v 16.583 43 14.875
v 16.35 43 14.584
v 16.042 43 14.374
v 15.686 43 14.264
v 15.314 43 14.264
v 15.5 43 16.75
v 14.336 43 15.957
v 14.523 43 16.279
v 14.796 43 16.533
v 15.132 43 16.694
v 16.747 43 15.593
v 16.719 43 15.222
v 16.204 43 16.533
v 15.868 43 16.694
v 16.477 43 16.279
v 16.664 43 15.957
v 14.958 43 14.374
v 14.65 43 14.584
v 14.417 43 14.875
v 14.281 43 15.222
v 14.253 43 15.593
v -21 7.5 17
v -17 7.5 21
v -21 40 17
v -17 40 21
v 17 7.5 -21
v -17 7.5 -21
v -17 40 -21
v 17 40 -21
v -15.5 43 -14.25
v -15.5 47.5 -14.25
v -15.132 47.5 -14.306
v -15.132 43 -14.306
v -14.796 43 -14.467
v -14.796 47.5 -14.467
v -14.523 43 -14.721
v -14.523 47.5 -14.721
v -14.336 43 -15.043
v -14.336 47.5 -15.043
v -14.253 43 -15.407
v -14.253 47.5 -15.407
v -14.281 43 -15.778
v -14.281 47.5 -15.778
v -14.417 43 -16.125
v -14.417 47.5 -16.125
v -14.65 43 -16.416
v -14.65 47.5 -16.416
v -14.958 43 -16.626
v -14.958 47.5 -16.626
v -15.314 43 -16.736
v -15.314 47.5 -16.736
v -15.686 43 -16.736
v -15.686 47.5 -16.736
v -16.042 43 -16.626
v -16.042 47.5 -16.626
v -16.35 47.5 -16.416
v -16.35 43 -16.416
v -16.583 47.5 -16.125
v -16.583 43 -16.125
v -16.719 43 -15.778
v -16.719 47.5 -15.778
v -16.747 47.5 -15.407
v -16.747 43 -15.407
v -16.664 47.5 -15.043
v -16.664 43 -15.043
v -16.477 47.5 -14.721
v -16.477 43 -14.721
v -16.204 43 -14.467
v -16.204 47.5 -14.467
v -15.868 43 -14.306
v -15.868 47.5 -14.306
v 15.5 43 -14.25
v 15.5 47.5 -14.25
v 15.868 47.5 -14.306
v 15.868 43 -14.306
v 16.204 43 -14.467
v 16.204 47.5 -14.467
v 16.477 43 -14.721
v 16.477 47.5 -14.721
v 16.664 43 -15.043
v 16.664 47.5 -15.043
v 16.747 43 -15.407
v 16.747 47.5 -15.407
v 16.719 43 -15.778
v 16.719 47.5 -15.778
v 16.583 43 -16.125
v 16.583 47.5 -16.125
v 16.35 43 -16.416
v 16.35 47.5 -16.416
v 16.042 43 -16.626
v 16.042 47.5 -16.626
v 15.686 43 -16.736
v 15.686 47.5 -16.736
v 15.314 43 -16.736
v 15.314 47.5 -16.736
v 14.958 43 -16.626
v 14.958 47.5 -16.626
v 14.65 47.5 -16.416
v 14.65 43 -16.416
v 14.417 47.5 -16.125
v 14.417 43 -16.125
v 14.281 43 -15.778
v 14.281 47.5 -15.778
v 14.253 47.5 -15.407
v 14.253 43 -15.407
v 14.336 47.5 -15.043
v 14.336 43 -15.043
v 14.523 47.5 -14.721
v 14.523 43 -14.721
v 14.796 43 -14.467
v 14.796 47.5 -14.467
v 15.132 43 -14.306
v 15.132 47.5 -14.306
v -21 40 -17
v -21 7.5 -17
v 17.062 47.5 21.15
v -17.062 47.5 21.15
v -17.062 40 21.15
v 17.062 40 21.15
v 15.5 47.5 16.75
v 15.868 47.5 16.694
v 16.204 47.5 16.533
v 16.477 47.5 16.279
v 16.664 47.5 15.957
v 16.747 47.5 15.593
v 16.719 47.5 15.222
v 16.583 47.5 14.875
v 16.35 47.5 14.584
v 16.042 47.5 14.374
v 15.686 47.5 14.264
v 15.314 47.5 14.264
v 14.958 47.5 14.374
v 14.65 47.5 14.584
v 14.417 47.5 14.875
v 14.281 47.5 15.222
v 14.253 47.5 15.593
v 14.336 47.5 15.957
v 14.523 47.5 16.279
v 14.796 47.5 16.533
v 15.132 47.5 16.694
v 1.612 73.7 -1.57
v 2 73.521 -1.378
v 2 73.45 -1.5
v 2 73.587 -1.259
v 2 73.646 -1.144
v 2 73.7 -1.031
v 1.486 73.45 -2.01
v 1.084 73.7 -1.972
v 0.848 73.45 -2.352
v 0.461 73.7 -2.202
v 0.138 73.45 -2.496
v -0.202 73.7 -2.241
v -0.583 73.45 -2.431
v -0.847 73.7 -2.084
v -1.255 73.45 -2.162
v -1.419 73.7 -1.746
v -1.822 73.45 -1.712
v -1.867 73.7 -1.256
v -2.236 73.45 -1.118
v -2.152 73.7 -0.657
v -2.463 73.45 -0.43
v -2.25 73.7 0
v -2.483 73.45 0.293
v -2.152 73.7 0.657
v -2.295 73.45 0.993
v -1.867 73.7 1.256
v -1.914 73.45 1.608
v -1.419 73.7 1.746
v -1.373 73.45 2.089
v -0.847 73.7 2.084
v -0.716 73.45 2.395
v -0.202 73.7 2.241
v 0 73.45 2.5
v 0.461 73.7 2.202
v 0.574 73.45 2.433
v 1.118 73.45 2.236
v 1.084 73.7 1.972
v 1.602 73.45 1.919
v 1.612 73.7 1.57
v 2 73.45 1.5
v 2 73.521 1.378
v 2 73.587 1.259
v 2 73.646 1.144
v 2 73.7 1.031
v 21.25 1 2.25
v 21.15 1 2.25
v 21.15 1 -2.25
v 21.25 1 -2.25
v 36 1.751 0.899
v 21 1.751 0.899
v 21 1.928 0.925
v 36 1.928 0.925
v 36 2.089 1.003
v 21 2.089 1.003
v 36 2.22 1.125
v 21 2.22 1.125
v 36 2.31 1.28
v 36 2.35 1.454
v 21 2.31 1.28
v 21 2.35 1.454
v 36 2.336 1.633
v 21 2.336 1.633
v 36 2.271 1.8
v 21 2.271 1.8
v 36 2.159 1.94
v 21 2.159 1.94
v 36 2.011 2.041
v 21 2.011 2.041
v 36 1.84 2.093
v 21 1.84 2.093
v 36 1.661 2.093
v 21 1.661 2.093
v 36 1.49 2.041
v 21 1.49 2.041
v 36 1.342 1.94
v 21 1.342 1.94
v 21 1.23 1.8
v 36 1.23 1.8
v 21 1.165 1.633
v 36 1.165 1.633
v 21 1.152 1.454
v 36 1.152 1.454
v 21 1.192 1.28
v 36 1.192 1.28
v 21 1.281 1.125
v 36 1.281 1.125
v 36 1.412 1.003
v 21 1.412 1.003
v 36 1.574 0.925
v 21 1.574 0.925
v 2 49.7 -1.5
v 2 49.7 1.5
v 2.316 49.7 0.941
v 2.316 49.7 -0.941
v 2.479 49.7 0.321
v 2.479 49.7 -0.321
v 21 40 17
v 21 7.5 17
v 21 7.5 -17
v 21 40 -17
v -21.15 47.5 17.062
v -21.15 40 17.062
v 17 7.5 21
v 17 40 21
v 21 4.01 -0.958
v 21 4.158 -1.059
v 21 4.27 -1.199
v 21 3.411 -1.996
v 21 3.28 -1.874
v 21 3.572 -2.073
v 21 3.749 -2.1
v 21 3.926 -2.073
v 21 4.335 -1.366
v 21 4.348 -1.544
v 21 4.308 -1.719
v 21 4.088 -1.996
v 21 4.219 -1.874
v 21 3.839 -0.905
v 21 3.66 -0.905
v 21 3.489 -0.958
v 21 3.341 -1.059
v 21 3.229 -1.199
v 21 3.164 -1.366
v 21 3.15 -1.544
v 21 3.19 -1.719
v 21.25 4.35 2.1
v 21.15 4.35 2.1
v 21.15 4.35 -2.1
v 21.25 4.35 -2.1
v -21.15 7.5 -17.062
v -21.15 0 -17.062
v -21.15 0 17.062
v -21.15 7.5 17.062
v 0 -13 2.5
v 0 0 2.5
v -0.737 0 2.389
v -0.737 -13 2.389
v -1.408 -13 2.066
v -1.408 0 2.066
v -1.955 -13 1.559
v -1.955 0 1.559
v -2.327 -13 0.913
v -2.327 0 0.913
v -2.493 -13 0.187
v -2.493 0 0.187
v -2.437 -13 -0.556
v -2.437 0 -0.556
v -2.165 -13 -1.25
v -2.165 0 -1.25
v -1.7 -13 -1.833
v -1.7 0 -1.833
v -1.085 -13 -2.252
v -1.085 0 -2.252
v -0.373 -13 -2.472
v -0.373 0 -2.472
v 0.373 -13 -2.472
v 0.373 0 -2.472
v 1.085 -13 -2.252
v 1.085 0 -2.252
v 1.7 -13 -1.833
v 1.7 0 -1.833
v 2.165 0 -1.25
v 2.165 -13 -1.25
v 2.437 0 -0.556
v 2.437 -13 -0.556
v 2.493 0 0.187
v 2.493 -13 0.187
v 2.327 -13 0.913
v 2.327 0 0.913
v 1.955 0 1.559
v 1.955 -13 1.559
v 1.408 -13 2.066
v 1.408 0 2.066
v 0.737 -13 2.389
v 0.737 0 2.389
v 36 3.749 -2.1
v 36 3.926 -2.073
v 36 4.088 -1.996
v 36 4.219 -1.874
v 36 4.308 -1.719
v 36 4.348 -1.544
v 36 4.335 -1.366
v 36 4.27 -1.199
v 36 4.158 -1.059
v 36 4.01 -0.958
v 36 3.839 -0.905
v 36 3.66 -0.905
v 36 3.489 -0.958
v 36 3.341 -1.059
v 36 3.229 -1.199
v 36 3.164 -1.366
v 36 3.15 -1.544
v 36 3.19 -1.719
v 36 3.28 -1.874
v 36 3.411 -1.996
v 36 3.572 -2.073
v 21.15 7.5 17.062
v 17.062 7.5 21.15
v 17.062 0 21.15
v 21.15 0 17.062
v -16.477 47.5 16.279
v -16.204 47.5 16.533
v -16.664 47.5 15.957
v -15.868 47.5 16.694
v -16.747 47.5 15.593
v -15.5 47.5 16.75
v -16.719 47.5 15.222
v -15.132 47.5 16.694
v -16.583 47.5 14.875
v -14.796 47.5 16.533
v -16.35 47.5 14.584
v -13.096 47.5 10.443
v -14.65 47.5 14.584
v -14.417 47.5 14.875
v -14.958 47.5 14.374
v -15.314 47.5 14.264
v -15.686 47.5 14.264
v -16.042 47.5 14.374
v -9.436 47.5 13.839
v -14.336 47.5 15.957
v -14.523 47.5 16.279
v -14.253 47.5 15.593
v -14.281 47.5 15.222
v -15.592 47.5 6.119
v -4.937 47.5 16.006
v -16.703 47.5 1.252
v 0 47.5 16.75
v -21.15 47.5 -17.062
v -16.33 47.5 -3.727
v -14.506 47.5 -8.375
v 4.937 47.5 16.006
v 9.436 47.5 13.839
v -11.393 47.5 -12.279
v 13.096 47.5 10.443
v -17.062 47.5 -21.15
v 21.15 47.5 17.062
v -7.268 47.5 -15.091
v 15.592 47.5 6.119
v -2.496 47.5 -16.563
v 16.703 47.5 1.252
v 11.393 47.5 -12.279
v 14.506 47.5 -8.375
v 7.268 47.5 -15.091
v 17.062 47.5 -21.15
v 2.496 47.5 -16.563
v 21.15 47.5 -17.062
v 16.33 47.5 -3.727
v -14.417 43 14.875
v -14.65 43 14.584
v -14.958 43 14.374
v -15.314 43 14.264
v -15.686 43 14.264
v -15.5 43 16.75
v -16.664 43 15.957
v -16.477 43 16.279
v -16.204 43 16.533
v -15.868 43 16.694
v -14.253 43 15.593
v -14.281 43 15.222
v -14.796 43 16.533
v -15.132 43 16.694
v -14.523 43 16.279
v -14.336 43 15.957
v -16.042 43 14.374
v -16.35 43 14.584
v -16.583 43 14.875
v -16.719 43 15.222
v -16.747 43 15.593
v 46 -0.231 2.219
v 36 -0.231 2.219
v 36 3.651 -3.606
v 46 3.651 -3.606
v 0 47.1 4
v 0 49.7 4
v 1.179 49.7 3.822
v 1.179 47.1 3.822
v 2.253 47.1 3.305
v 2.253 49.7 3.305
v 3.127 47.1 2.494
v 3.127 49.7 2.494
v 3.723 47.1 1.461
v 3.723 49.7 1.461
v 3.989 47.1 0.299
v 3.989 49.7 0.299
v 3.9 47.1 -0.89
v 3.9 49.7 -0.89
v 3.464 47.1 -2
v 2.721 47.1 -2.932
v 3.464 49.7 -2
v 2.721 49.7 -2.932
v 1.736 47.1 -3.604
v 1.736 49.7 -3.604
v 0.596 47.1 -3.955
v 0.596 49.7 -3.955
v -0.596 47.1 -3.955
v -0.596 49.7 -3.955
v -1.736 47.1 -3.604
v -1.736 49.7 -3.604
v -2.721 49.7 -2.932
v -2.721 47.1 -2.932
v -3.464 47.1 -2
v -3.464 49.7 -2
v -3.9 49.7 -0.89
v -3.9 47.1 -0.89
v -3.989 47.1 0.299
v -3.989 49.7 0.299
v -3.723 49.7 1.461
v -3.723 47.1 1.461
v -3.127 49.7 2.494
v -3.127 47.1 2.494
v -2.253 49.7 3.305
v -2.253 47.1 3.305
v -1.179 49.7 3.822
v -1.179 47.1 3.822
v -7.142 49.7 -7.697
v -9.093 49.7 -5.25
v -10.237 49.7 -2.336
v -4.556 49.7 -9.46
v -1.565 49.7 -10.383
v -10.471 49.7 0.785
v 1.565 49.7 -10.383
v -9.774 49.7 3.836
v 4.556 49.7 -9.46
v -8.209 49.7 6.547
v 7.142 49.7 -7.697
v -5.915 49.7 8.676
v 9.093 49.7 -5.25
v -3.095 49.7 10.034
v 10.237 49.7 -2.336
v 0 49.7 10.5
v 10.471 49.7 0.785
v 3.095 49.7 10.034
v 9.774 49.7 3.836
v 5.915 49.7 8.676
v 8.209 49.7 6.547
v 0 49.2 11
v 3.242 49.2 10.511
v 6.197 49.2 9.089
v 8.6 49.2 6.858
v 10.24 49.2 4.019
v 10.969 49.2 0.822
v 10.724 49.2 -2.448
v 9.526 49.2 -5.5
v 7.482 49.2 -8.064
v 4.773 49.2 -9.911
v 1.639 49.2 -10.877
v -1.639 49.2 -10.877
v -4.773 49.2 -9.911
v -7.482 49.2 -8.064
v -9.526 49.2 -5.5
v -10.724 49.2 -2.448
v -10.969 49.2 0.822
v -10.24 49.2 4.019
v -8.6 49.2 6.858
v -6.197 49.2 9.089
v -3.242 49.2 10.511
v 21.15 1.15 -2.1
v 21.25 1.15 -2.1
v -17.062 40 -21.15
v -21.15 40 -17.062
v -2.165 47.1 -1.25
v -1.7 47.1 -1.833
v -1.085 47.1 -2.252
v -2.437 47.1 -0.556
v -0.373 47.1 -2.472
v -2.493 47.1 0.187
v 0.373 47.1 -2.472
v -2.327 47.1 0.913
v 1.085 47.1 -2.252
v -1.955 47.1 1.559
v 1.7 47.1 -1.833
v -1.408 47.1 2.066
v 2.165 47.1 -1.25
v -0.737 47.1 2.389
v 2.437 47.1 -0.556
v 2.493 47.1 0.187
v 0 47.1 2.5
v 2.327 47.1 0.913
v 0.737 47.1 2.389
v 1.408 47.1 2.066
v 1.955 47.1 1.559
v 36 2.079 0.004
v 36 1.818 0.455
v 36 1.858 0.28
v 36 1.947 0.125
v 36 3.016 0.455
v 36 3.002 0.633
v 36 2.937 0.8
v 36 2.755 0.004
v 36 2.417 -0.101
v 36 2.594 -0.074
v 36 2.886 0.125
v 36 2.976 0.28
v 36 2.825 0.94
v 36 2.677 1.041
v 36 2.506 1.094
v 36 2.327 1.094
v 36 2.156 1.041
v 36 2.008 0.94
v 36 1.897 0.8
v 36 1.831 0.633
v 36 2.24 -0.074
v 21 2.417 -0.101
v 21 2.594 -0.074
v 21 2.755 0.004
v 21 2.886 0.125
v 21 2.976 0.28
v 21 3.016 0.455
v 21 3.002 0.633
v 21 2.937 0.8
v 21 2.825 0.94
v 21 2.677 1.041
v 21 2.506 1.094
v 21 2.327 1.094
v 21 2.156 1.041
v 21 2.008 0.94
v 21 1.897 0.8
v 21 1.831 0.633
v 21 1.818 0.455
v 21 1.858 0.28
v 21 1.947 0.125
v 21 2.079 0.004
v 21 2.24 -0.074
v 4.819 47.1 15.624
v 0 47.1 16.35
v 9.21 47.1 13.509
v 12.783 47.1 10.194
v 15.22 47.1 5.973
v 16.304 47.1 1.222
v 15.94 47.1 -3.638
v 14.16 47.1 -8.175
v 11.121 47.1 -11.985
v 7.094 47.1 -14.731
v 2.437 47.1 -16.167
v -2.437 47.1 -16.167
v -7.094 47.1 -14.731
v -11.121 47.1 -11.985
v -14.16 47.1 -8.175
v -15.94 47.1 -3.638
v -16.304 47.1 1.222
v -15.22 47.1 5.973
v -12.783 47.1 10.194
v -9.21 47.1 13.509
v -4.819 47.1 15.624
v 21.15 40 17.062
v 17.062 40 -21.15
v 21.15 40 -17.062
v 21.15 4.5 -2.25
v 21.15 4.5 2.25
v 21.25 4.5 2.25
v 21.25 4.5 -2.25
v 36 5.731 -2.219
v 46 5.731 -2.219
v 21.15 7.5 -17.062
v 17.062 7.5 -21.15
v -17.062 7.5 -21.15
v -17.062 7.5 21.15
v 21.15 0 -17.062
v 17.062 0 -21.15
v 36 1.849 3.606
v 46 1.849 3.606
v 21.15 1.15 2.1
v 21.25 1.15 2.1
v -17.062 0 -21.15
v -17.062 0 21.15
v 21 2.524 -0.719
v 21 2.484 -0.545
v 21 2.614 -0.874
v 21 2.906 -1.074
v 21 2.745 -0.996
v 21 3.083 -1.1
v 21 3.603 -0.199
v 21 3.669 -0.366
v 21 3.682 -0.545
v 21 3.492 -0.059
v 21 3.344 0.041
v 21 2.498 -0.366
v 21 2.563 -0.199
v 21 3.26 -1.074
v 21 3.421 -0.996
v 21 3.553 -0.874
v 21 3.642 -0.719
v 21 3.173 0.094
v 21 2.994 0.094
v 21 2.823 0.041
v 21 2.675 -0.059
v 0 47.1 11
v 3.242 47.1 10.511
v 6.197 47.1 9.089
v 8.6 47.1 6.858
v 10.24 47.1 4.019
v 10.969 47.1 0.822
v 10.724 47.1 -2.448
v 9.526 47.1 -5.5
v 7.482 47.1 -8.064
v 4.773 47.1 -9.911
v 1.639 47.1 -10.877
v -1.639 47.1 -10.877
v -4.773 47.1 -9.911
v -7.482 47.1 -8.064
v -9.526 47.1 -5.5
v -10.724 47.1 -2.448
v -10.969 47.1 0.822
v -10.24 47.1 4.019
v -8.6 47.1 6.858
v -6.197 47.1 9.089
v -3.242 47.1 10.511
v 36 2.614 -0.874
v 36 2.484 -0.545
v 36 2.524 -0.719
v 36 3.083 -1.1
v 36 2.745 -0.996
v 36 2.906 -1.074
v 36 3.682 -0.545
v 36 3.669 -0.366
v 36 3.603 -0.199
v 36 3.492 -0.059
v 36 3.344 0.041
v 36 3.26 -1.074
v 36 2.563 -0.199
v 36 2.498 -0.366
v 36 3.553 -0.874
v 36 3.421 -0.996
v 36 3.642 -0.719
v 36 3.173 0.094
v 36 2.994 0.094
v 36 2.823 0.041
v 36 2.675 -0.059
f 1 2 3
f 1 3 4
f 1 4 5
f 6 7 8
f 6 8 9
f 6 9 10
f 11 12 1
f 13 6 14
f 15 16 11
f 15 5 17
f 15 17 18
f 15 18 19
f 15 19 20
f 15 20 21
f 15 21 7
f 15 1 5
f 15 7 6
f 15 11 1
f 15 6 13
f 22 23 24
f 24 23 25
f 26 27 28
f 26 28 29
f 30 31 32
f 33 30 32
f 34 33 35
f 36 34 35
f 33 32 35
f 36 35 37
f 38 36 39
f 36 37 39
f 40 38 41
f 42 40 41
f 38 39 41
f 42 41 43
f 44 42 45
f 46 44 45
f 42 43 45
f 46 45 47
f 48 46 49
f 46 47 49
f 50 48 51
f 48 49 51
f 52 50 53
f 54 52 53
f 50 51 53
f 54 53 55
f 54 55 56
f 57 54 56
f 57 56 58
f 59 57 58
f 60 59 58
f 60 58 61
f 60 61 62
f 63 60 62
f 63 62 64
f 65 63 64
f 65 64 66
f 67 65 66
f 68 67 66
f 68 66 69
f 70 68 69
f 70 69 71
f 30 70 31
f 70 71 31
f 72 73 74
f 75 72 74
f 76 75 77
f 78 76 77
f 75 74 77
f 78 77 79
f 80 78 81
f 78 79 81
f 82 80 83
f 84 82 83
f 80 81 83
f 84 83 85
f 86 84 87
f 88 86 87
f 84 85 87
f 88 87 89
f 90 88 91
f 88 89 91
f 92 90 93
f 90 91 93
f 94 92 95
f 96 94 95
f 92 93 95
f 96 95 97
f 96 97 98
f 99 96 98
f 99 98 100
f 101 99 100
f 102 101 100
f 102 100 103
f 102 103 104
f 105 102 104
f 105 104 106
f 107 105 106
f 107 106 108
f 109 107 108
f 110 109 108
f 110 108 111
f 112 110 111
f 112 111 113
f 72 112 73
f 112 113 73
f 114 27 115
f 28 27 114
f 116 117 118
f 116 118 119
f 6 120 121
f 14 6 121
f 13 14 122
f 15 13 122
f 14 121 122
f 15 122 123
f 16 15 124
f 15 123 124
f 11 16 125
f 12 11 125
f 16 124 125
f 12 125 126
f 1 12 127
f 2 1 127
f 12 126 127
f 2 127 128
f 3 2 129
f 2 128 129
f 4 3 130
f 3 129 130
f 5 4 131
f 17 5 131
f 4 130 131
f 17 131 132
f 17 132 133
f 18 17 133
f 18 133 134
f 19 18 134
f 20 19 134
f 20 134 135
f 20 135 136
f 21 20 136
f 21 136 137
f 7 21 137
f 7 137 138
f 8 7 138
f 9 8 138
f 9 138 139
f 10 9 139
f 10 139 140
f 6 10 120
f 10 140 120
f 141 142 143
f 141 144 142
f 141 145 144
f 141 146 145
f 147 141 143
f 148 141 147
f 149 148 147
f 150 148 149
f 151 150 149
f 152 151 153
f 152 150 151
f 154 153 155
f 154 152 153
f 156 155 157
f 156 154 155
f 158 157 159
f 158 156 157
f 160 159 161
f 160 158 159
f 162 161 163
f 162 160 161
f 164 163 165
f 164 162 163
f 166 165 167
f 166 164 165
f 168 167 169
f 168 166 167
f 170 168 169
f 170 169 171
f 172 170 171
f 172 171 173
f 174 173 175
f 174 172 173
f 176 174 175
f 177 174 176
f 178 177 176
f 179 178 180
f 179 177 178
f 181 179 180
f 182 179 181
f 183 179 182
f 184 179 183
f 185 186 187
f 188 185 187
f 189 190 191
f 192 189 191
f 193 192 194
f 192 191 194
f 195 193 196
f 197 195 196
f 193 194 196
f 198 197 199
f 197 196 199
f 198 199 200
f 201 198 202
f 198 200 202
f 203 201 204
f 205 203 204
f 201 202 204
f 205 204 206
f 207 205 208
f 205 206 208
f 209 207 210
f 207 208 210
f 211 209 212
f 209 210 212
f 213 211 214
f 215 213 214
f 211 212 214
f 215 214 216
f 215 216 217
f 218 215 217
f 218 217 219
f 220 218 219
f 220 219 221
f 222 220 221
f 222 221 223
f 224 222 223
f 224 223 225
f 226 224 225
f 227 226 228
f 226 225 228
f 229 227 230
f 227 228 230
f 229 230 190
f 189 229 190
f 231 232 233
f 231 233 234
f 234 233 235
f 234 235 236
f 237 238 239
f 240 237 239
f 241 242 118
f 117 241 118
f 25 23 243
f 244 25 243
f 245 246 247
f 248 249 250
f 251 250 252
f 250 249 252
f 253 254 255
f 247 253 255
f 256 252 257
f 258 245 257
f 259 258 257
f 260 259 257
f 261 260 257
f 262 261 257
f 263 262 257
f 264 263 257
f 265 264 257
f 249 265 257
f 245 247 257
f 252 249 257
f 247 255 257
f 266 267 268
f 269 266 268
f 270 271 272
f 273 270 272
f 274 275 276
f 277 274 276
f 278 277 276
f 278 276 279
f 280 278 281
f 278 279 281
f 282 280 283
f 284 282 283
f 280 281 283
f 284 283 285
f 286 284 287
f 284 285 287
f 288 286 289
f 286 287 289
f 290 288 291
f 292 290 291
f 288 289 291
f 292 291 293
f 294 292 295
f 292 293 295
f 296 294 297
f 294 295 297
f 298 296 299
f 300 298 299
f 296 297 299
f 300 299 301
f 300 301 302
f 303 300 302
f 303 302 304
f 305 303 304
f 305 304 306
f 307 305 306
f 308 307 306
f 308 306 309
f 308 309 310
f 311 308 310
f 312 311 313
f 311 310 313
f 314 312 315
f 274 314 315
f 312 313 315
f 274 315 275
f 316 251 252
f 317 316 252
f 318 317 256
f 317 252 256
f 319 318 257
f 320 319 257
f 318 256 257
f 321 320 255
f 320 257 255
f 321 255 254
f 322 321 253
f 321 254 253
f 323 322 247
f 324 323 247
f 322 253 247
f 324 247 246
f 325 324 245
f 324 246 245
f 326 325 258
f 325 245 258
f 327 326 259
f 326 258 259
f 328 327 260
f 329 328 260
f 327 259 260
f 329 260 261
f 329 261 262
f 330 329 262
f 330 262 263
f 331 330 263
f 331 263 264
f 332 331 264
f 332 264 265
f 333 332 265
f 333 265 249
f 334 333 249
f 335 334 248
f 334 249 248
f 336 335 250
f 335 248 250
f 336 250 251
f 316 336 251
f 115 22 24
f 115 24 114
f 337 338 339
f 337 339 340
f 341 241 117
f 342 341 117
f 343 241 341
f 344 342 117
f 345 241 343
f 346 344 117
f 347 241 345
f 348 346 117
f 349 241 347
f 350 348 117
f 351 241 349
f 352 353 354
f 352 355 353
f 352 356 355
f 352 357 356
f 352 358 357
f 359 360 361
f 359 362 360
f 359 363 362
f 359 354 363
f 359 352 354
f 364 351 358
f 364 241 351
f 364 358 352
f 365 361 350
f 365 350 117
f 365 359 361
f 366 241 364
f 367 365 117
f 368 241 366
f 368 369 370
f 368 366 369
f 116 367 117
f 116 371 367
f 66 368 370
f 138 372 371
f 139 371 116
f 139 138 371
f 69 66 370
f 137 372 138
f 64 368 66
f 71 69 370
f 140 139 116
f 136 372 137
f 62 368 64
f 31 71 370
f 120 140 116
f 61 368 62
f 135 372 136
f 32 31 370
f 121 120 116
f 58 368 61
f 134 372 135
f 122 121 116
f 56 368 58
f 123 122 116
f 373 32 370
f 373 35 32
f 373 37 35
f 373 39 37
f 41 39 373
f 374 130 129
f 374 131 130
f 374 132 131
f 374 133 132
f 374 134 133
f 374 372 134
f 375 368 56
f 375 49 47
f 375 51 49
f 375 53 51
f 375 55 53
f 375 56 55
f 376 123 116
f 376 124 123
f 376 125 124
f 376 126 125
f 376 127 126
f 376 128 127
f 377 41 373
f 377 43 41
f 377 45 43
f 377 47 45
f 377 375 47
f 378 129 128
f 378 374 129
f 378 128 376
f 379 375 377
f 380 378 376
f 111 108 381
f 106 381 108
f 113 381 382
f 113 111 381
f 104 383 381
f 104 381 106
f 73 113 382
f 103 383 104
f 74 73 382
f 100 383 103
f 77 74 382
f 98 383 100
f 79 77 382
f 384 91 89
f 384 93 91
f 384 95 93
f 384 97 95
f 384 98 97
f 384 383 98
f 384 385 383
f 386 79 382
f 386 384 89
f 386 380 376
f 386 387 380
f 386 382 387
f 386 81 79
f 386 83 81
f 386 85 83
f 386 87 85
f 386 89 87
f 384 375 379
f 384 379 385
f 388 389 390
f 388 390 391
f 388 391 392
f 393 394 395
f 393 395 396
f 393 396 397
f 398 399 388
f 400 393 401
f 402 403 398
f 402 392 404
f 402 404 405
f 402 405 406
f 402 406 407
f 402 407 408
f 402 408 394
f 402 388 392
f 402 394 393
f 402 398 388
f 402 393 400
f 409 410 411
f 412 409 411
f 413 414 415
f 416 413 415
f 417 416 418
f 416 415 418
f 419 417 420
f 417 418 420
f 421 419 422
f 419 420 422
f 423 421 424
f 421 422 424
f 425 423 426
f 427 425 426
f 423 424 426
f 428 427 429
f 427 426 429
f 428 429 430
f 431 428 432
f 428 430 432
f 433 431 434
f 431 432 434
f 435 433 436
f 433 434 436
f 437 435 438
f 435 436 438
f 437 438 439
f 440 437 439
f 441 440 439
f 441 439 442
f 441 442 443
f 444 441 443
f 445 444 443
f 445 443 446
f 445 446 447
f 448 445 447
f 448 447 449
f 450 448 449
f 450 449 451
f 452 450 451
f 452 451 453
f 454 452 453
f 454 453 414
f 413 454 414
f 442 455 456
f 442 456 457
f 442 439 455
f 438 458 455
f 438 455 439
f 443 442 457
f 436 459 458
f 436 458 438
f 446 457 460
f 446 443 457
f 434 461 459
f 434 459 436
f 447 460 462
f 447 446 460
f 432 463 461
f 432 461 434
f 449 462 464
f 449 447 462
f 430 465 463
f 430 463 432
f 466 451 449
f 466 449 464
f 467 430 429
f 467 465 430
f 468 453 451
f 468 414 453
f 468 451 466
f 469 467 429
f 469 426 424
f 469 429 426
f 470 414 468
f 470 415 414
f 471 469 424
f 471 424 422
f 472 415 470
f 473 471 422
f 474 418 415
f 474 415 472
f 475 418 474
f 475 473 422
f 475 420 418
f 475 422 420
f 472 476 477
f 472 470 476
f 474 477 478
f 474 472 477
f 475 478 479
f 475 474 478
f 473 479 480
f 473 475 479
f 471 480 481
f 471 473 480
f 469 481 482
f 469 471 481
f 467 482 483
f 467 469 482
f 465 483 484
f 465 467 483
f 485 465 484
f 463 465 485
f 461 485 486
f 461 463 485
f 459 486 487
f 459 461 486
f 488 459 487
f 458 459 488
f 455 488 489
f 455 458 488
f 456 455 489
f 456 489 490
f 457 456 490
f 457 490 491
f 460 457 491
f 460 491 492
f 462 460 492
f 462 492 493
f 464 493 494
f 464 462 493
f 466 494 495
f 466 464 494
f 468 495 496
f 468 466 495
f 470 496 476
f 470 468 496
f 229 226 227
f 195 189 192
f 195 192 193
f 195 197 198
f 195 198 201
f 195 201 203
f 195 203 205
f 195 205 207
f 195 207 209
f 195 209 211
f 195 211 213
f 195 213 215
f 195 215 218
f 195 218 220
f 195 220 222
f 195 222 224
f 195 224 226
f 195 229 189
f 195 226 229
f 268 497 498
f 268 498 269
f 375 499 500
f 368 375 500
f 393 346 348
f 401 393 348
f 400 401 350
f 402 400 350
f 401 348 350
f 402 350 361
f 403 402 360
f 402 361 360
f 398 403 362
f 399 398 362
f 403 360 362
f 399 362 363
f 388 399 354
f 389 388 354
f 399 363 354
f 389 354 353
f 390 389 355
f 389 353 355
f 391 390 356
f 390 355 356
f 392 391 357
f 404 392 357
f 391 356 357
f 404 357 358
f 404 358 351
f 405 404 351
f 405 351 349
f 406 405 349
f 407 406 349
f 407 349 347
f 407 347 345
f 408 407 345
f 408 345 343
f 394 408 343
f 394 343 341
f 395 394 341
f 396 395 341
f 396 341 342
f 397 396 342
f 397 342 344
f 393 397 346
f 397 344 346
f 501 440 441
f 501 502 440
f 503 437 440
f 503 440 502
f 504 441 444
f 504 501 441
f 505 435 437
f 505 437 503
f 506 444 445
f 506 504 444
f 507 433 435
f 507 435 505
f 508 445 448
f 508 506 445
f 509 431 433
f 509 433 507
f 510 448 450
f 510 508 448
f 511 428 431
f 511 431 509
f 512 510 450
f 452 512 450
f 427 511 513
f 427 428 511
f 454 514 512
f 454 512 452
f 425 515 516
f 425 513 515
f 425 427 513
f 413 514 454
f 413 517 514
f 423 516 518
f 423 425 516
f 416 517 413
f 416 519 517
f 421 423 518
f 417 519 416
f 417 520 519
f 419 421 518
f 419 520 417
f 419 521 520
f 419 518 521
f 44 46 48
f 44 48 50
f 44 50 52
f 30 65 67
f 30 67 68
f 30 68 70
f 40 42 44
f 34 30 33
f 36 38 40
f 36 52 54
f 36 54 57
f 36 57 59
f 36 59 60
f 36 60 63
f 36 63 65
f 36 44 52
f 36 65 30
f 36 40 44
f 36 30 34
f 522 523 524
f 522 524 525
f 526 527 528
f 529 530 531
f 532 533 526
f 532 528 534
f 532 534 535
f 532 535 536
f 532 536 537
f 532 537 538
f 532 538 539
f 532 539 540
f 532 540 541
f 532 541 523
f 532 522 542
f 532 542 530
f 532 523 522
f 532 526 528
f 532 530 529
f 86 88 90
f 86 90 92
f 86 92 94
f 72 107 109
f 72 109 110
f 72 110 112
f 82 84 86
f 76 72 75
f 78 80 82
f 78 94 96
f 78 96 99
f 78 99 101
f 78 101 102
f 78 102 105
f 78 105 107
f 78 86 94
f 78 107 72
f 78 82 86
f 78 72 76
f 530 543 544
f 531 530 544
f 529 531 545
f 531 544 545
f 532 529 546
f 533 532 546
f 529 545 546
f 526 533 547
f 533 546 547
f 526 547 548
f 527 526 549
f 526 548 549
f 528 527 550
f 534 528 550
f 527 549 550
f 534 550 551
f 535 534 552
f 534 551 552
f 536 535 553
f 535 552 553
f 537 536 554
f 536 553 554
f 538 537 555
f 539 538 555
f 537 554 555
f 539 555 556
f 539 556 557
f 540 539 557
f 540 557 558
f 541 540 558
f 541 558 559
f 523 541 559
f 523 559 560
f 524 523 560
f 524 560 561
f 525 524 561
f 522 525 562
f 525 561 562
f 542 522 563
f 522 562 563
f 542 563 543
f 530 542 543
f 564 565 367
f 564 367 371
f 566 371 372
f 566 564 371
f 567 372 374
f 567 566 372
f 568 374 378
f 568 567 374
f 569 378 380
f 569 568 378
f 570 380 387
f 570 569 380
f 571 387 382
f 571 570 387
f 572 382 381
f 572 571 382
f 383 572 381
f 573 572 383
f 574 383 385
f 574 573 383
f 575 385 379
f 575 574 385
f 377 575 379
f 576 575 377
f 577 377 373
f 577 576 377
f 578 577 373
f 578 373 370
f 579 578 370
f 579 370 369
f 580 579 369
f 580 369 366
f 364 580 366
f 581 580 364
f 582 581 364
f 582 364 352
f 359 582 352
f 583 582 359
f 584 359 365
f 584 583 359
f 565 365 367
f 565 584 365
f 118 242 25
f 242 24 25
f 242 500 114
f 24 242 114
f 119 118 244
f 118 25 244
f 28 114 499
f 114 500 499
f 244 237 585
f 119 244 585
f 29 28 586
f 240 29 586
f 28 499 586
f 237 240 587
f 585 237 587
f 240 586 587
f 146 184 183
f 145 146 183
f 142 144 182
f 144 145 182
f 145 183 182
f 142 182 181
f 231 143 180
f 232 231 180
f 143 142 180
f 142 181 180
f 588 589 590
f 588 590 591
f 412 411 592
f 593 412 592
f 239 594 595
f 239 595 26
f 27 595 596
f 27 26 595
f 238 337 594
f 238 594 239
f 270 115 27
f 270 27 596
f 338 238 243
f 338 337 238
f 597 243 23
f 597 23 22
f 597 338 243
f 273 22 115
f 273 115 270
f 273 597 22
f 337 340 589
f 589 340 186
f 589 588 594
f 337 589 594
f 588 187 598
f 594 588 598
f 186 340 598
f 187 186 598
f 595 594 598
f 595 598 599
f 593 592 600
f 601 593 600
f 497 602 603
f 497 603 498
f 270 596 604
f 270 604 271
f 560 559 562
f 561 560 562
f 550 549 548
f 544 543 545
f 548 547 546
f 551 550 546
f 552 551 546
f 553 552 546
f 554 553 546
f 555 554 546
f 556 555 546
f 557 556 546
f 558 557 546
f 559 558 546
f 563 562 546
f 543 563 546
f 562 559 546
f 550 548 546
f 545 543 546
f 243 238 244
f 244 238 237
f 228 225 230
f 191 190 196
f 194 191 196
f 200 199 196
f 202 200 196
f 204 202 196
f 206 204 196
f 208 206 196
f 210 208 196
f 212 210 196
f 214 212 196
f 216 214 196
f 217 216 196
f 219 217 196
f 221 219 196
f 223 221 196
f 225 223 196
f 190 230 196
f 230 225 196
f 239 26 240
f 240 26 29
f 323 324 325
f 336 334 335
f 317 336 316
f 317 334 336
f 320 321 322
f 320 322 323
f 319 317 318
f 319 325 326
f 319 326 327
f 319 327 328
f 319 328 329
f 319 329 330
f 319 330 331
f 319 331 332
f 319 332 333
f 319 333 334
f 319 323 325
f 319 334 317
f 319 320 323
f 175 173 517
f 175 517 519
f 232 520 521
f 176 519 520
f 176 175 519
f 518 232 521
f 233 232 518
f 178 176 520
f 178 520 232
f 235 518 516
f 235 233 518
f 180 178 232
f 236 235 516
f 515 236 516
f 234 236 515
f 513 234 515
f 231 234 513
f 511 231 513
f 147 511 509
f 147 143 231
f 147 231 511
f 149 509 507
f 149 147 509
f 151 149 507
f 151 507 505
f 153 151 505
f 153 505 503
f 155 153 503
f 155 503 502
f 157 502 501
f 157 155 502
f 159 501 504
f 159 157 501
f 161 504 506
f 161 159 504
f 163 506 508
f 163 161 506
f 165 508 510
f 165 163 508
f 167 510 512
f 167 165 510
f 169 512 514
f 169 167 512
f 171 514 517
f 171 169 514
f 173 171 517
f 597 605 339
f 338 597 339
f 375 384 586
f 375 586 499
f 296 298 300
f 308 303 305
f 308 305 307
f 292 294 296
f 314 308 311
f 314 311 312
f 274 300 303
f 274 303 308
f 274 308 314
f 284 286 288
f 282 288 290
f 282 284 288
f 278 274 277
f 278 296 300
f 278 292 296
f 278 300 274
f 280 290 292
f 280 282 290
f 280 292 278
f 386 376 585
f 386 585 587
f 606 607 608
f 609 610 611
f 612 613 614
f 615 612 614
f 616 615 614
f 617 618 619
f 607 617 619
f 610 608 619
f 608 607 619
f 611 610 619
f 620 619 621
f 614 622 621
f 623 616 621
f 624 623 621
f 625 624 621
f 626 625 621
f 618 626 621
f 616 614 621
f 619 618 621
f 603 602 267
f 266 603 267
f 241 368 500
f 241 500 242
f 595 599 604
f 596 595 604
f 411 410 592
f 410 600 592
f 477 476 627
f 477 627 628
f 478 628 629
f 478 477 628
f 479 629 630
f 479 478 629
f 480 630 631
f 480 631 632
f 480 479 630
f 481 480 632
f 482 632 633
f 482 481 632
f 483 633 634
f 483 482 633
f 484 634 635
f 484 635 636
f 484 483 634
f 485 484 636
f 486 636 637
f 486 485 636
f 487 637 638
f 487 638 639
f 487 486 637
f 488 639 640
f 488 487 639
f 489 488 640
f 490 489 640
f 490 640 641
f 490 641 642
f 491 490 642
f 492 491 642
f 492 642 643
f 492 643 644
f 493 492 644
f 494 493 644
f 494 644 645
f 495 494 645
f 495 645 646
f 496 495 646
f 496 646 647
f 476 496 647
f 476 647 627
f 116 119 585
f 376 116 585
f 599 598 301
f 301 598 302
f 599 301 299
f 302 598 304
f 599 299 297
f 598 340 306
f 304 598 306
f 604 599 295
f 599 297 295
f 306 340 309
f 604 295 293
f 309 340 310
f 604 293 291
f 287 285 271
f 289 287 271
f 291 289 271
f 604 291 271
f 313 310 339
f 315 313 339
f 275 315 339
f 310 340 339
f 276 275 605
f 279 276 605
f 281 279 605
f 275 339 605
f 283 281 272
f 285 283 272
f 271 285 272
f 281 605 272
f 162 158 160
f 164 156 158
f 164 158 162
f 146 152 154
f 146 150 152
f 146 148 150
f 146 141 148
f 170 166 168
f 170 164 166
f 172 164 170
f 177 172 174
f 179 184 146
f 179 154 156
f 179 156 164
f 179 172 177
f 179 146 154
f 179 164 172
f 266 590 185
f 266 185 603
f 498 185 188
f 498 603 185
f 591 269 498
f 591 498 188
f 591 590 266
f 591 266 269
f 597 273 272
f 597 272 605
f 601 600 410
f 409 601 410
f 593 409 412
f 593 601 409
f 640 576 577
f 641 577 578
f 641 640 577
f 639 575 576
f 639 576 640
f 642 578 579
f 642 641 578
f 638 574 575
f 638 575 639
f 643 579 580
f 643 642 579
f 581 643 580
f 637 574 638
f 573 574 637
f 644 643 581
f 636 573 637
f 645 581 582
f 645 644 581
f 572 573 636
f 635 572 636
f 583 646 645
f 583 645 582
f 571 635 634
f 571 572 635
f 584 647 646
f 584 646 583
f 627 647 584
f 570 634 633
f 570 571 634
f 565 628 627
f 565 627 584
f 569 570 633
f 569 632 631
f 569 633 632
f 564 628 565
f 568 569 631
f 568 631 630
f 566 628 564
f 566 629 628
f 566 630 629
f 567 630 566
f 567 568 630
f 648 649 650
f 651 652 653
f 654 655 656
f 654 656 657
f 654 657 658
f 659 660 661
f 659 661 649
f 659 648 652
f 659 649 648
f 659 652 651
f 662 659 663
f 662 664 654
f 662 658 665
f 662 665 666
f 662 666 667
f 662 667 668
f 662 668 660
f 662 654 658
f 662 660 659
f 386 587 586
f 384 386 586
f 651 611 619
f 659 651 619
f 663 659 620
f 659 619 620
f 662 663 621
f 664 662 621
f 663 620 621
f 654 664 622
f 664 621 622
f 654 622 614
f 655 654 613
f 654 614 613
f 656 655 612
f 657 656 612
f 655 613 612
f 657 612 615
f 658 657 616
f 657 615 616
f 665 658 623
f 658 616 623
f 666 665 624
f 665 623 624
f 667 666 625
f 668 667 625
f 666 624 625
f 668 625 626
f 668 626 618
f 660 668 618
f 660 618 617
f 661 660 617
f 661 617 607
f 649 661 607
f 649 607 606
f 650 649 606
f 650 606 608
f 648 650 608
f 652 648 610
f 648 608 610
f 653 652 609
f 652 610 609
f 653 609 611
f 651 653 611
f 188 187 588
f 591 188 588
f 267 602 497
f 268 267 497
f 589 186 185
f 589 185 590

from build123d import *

# Parameters (mm, degrees)
CROQUIS1_W                          = 42
CROQUIS1_H                          = 42
SALIENTE_EXTRUIR1_DEPTH             = 47.5
CHAFL_N1_SIZE                       = 4
CROQUIS3_R                          = 16.25
CORTAR_EXTRUIR1_DEPTH               = 0.4
SALIENTE_EXTRUIR2_REACH             = 59.897
CROQUIS4_R                          = 11
CROQUIS4_R_2                        = 4
CHAFL_N2_SIZE                       = 0.5
CROQUIS5_R                          = 2.5
SALIENTE_EXTRUIR3_DEPTH             = 24
SALIENTE_EXTRUIR3_DIRECTION_2_REACH = 59.897
CORTAR_EXTRUIR2_DEPTH               = 24
CHAFL_N3_SIZE                       = 0.25
SALIENTE_EXTRUIR9_DEPTH             = 7.5
SALIENTE_EXTRUIR10_DEPTH            = 7.5
CROQUIS7_R                          = 1.25
CORTAR_EXTRUIR3_DEPTH               = 4.5
CROQUIS10_W                         = 4.5
CROQUIS10_H                         = 3.5
CROQUIS10_W_2                       = 4.2
CROQUIS10_H_2                       = 3.2
SALIENTE_EXTRUIR7_DEPTH             = 0.1
CROQUIS11_R                         = 0.600632734
SALIENTE_EXTRUIR8_DEPTH             = 15
SALIENTE_EXTRUIR8_2_DEPTH           = 15
SALIENTE_EXTRUIR8_3_DEPTH           = 15
SALIENTE_EXTRUIR8_4_DEPTH           = 15
SALIENTE_EXTRUIR11_DEPTH            = 10
CROQUIS15_R                         = 2.5
SALIENTE_EXTRUIR12_DEPTH            = 13


with BuildPart() as part:
    # Croquis1 → Saliente-Extruir1 (new body)
    with BuildSketch(Plane(origin=(0, 0, 0), x_dir=(1, 0, 0), z_dir=(0, 1, 0))):
        Rectangle(CROQUIS1_W, CROQUIS1_H)
    extrude(amount=SALIENTE_EXTRUIR1_DEPTH)

    # Chaflán1
    chafl_n1_edges = [part.edges().sort_by_distance(p)[0] for p in [
        (-21, 23.75, -21),
        (21, 23.75, -21),
        (21, 23.75, 21),
        (-21, 23.75, 21),
    ]]
    chamfer(chafl_n1_edges, length=CHAFL_N1_SIZE)

    # Croquis3 → Cortar-Extruir1 (cut)
    with BuildSketch(Plane(origin=(0, 47.5, 0), x_dir=(1, 0, 0), z_dir=(0, 1, 0))):
        with Locations(Location((0, 0, 0), (0, 0, 270))):
            Circle(CROQUIS3_R)
    extrude(amount=-CORTAR_EXTRUIR1_DEPTH, mode=Mode.SUBTRACT)

    # Croquis4 → Saliente-Extruir2 (add, up to next)
    with BuildSketch(Plane(origin=(0, 49.7, 0), x_dir=(1, 0, 0), z_dir=(0, 1, 0)), mode=Mode.PRIVATE) as saliente_extruir2_sk1:
        with Locations(Location((0, 0, 0), (0, 0, 270))):
            Circle(CROQUIS4_R)
        with Locations(Location((0, 0, 0), (0, 0, 270))):
            Circle(CROQUIS4_R_2, mode=Mode.SUBTRACT)
    saliente_extruir2_tool1 = extrude(saliente_extruir2_sk1.sketch, amount=-SALIENTE_EXTRUIR2_REACH, mode=Mode.PRIVATE) - part.part
    add(saliente_extruir2_tool1.solids().sort_by_distance((0, 49.7, -10.688873))[0])

    # Chaflán2
    # the kernel refuses this chamfer: 0.5 mm, written as the material it takes off along each edge
    with BuildSketch(Plane(origin=(0, 47.5, 0), x_dir=(0, 0, 1), z_dir=(-1, 0, 0))) as chafl_n2_piece_1_section:
        Polygon((16.25 + CHAFL_N2_SIZE, 0), (16.25, -CHAFL_N2_SIZE), (16.25, 0), align=None)
    chafl_n2_piece_1 = revolve(axis=Axis((0, 47.5, 0), (0, 1, 0)), mode=Mode.PRIVATE)
    chafl_n2_piece_1 = split(chafl_n2_piece_1, bisect_by=Plane(origin=(0, 47.1, -16.540253215), z_dir=(0, 1, 0)), keep=Keep.TOP, mode=Mode.PRIVATE)
    add(chafl_n2_piece_1, mode=Mode.SUBTRACT)
    with BuildSketch(Plane(origin=(0, 49.7, 0), x_dir=(0, 0, 1), z_dir=(-1, 0, 0))) as chafl_n2_piece_2:
        Polygon((11, -CHAFL_N2_SIZE), (11 - CHAFL_N2_SIZE, 0), (11, 0), align=None)
    revolve(axis=Axis((0, 49.7, 0), (0, 1, 0)), mode=Mode.SUBTRACT)


with BuildPart() as body_2:
    # Croquis5 → Saliente-Extruir3 (new body)
    with BuildSketch(Plane(origin=(0, 49.7, 0), x_dir=(1, 0, 0), z_dir=(0, 1, 0))):
        with Locations(Location((0, 0, 0), (0, 0, 270))):
            Circle(CROQUIS5_R)
    extrude(amount=SALIENTE_EXTRUIR3_DEPTH)


    # Croquis5 → Saliente-Extruir3 direction 2 (add, up to next)
    with BuildSketch(Plane(origin=(0, 49.7, 0), x_dir=(1, 0, 0), z_dir=(0, 1, 0)), mode=Mode.PRIVATE) as saliente_extruir3_direction_2_sk1:
        with Locations(Location((0, 0, 0), (0, 0, 270))):
            Circle(CROQUIS5_R)
    saliente_extruir3_direction_2_tool1 = extrude(saliente_extruir3_direction_2_sk1.sketch, amount=-SALIENTE_EXTRUIR3_DIRECTION_2_REACH, mode=Mode.PRIVATE) - part.part
    add(saliente_extruir3_direction_2_tool1.solids().sort_by_distance((0, 49.7, 0))[0])

    # Croquis6 → Cortar-Extruir2 (cut)
    with BuildSketch(Plane(origin=(0, 73.7, 0), x_dir=(1, 0, 0), z_dir=(0, 1, 0))):
        with BuildLine():
            Line((2, 1.5), (2, -1.5))
            ThreePointArc((2, -1.5), (2.5, 0), (2, 1.5))
        make_face()
    extrude(amount=-CORTAR_EXTRUIR2_DEPTH, mode=Mode.SUBTRACT)

    # Chaflán3
    chafl_n3_edges = [body_2.edges().sort_by_distance(p)[0] for p in [
        (-2.236067977, 73.7, -1.118033989),
    ]]
    chamfer(chafl_n3_edges, length=CHAFL_N3_SIZE)


    add(part.part)  # Saliente-Extruir9 merges part
    # Croquis12 → Saliente-Extruir9 (add)
    with BuildSketch(Plane(origin=(0, 47.5, 0), x_dir=(1, 0, 0), z_dir=(0, 1, 0))):
        Polygon((-17.062132034, 21.15), (-21.15, 17.062132034), (-21.15, -17.062132034), (-17.062132034, -21.15), (17.062132034, -21.15), (21.15, -17.062132034), (21.15, 17.062132034), (17.062132034, 21.15), align=None)
        Polygon((-17, 21), (-21, 17), (-21, -17), (-17, -21), (17, -21), (21, -17), (21, 17), (17, 21), align=None, mode=Mode.SUBTRACT)
    extrude(amount=-SALIENTE_EXTRUIR9_DEPTH)

    # Croquis13 → Saliente-Extruir10 (add)
    with BuildSketch(Plane.XZ):
        Polygon((-17.062132034, -21.15), (-21.15, -17.062132034), (-21.15, 17.062132034), (-17.062132034, 21.15), (17.062132034, 21.15), (21.15, 17.062132034), (21.15, -17.062132034), (17.062132034, -21.15), align=None)
        Polygon((-17, -21), (-21, -17), (-21, 17), (-17, 21), (17, 21), (21, 17), (21, -17), (17, -21), align=None, mode=Mode.SUBTRACT)
    extrude(amount=-SALIENTE_EXTRUIR10_DEPTH)

    # Croquis7 → Cortar-Extruir3 (cut)
    with BuildSketch(Plane(origin=(0, 47.5, 0), x_dir=(1, 0, 0), z_dir=(0, 1, 0))):
        with Locations(Location((-15.5, 15.5, 0), (0, 0, 270))):
            Circle(CROQUIS7_R)
        with Locations(Location((15.5, 15.5, 0), (0, 0, 270))):
            Circle(CROQUIS7_R)
        with Locations(Location((15.5, -15.5, 0), (0, 0, 270))):
            Circle(CROQUIS7_R)
        with Locations(Location((-15.5, -15.5, 0), (0, 0, 270))):
            Circle(CROQUIS7_R)
    extrude(amount=-CORTAR_EXTRUIR3_DEPTH, mode=Mode.SUBTRACT)

    # Croquis10 → Saliente-Extruir7 (add)
    with BuildSketch(Plane(origin=(21.15, 0, 0), x_dir=(0, 0, -1), z_dir=(1, 0, 0))):
        with Locations((0, 2.75)):
            Rectangle(CROQUIS10_W, CROQUIS10_H)
        with Locations((0, 2.75)):
            Rectangle(CROQUIS10_W_2, CROQUIS10_H_2, mode=Mode.SUBTRACT)
    extrude(amount=SALIENTE_EXTRUIR7_DEPTH)

    # Croquis15 → Saliente-Extruir12 (add)
    with BuildSketch(Plane.XZ):
        with Locations(Location((0, 0, 0), (0, 0, 90))):
            Circle(CROQUIS15_R)
    extrude(amount=SALIENTE_EXTRUIR12_DEPTH)


with BuildPart() as body_2_2:
    # Croquis11 → Saliente-Extruir8 (new body)
    with BuildSketch(Plane(origin=(21, 0, 0), x_dir=(0, 0, -1), z_dir=(1, 0, 0))):
        with Locations((-1.499367266, 1.750632734)):
            Circle(CROQUIS11_R)
    extrude(amount=SALIENTE_EXTRUIR8_DEPTH)


with BuildPart() as body_3:
    # Croquis11 → Saliente-Extruir8 2 (new body)
    with BuildSketch(Plane(origin=(21, 0, 0), x_dir=(0, 0, -1), z_dir=(1, 0, 0))):
        with Locations((-0.499789089, 2.416877578)):
            Circle(CROQUIS11_R)
    extrude(amount=SALIENTE_EXTRUIR8_2_DEPTH)


with BuildPart() as body_4:
    # Croquis11 → Saliente-Extruir8 3 (new body)
    with BuildSketch(Plane(origin=(21, 0, 0), x_dir=(0, 0, -1), z_dir=(1, 0, 0))):
        with Locations((0.499789089, 3.083122422)):
            Circle(CROQUIS11_R)
    extrude(amount=SALIENTE_EXTRUIR8_3_DEPTH)


with BuildPart() as body_5:
    # Croquis11 → Saliente-Extruir8 4 (new body)
    with BuildSketch(Plane(origin=(21, 0, 0), x_dir=(0, 0, -1), z_dir=(1, 0, 0))):
        with Locations((1.499367266, 3.749367266)):
            Circle(CROQUIS11_R)
    extrude(amount=SALIENTE_EXTRUIR8_4_DEPTH)


with BuildPart() as body_6:
    # Croquis14 → Saliente-Extruir11 (new body)
    with BuildSketch(Plane(origin=(36, 0, 0), x_dir=(0, 0, -1), z_dir=(1, 0, 0))):
        Polygon((-2.219091147, -0.231297449), (3.605639046, 3.651036666), (2.219091147, 5.731297449), (-3.605639046, 1.848963334), align=None)
    extrude(amount=SALIENTE_EXTRUIR11_DEPTH)


solid = Compound([body_2.part, body_2_2.part, body_3.part, body_4.part, body_5.part, body_6.part])
